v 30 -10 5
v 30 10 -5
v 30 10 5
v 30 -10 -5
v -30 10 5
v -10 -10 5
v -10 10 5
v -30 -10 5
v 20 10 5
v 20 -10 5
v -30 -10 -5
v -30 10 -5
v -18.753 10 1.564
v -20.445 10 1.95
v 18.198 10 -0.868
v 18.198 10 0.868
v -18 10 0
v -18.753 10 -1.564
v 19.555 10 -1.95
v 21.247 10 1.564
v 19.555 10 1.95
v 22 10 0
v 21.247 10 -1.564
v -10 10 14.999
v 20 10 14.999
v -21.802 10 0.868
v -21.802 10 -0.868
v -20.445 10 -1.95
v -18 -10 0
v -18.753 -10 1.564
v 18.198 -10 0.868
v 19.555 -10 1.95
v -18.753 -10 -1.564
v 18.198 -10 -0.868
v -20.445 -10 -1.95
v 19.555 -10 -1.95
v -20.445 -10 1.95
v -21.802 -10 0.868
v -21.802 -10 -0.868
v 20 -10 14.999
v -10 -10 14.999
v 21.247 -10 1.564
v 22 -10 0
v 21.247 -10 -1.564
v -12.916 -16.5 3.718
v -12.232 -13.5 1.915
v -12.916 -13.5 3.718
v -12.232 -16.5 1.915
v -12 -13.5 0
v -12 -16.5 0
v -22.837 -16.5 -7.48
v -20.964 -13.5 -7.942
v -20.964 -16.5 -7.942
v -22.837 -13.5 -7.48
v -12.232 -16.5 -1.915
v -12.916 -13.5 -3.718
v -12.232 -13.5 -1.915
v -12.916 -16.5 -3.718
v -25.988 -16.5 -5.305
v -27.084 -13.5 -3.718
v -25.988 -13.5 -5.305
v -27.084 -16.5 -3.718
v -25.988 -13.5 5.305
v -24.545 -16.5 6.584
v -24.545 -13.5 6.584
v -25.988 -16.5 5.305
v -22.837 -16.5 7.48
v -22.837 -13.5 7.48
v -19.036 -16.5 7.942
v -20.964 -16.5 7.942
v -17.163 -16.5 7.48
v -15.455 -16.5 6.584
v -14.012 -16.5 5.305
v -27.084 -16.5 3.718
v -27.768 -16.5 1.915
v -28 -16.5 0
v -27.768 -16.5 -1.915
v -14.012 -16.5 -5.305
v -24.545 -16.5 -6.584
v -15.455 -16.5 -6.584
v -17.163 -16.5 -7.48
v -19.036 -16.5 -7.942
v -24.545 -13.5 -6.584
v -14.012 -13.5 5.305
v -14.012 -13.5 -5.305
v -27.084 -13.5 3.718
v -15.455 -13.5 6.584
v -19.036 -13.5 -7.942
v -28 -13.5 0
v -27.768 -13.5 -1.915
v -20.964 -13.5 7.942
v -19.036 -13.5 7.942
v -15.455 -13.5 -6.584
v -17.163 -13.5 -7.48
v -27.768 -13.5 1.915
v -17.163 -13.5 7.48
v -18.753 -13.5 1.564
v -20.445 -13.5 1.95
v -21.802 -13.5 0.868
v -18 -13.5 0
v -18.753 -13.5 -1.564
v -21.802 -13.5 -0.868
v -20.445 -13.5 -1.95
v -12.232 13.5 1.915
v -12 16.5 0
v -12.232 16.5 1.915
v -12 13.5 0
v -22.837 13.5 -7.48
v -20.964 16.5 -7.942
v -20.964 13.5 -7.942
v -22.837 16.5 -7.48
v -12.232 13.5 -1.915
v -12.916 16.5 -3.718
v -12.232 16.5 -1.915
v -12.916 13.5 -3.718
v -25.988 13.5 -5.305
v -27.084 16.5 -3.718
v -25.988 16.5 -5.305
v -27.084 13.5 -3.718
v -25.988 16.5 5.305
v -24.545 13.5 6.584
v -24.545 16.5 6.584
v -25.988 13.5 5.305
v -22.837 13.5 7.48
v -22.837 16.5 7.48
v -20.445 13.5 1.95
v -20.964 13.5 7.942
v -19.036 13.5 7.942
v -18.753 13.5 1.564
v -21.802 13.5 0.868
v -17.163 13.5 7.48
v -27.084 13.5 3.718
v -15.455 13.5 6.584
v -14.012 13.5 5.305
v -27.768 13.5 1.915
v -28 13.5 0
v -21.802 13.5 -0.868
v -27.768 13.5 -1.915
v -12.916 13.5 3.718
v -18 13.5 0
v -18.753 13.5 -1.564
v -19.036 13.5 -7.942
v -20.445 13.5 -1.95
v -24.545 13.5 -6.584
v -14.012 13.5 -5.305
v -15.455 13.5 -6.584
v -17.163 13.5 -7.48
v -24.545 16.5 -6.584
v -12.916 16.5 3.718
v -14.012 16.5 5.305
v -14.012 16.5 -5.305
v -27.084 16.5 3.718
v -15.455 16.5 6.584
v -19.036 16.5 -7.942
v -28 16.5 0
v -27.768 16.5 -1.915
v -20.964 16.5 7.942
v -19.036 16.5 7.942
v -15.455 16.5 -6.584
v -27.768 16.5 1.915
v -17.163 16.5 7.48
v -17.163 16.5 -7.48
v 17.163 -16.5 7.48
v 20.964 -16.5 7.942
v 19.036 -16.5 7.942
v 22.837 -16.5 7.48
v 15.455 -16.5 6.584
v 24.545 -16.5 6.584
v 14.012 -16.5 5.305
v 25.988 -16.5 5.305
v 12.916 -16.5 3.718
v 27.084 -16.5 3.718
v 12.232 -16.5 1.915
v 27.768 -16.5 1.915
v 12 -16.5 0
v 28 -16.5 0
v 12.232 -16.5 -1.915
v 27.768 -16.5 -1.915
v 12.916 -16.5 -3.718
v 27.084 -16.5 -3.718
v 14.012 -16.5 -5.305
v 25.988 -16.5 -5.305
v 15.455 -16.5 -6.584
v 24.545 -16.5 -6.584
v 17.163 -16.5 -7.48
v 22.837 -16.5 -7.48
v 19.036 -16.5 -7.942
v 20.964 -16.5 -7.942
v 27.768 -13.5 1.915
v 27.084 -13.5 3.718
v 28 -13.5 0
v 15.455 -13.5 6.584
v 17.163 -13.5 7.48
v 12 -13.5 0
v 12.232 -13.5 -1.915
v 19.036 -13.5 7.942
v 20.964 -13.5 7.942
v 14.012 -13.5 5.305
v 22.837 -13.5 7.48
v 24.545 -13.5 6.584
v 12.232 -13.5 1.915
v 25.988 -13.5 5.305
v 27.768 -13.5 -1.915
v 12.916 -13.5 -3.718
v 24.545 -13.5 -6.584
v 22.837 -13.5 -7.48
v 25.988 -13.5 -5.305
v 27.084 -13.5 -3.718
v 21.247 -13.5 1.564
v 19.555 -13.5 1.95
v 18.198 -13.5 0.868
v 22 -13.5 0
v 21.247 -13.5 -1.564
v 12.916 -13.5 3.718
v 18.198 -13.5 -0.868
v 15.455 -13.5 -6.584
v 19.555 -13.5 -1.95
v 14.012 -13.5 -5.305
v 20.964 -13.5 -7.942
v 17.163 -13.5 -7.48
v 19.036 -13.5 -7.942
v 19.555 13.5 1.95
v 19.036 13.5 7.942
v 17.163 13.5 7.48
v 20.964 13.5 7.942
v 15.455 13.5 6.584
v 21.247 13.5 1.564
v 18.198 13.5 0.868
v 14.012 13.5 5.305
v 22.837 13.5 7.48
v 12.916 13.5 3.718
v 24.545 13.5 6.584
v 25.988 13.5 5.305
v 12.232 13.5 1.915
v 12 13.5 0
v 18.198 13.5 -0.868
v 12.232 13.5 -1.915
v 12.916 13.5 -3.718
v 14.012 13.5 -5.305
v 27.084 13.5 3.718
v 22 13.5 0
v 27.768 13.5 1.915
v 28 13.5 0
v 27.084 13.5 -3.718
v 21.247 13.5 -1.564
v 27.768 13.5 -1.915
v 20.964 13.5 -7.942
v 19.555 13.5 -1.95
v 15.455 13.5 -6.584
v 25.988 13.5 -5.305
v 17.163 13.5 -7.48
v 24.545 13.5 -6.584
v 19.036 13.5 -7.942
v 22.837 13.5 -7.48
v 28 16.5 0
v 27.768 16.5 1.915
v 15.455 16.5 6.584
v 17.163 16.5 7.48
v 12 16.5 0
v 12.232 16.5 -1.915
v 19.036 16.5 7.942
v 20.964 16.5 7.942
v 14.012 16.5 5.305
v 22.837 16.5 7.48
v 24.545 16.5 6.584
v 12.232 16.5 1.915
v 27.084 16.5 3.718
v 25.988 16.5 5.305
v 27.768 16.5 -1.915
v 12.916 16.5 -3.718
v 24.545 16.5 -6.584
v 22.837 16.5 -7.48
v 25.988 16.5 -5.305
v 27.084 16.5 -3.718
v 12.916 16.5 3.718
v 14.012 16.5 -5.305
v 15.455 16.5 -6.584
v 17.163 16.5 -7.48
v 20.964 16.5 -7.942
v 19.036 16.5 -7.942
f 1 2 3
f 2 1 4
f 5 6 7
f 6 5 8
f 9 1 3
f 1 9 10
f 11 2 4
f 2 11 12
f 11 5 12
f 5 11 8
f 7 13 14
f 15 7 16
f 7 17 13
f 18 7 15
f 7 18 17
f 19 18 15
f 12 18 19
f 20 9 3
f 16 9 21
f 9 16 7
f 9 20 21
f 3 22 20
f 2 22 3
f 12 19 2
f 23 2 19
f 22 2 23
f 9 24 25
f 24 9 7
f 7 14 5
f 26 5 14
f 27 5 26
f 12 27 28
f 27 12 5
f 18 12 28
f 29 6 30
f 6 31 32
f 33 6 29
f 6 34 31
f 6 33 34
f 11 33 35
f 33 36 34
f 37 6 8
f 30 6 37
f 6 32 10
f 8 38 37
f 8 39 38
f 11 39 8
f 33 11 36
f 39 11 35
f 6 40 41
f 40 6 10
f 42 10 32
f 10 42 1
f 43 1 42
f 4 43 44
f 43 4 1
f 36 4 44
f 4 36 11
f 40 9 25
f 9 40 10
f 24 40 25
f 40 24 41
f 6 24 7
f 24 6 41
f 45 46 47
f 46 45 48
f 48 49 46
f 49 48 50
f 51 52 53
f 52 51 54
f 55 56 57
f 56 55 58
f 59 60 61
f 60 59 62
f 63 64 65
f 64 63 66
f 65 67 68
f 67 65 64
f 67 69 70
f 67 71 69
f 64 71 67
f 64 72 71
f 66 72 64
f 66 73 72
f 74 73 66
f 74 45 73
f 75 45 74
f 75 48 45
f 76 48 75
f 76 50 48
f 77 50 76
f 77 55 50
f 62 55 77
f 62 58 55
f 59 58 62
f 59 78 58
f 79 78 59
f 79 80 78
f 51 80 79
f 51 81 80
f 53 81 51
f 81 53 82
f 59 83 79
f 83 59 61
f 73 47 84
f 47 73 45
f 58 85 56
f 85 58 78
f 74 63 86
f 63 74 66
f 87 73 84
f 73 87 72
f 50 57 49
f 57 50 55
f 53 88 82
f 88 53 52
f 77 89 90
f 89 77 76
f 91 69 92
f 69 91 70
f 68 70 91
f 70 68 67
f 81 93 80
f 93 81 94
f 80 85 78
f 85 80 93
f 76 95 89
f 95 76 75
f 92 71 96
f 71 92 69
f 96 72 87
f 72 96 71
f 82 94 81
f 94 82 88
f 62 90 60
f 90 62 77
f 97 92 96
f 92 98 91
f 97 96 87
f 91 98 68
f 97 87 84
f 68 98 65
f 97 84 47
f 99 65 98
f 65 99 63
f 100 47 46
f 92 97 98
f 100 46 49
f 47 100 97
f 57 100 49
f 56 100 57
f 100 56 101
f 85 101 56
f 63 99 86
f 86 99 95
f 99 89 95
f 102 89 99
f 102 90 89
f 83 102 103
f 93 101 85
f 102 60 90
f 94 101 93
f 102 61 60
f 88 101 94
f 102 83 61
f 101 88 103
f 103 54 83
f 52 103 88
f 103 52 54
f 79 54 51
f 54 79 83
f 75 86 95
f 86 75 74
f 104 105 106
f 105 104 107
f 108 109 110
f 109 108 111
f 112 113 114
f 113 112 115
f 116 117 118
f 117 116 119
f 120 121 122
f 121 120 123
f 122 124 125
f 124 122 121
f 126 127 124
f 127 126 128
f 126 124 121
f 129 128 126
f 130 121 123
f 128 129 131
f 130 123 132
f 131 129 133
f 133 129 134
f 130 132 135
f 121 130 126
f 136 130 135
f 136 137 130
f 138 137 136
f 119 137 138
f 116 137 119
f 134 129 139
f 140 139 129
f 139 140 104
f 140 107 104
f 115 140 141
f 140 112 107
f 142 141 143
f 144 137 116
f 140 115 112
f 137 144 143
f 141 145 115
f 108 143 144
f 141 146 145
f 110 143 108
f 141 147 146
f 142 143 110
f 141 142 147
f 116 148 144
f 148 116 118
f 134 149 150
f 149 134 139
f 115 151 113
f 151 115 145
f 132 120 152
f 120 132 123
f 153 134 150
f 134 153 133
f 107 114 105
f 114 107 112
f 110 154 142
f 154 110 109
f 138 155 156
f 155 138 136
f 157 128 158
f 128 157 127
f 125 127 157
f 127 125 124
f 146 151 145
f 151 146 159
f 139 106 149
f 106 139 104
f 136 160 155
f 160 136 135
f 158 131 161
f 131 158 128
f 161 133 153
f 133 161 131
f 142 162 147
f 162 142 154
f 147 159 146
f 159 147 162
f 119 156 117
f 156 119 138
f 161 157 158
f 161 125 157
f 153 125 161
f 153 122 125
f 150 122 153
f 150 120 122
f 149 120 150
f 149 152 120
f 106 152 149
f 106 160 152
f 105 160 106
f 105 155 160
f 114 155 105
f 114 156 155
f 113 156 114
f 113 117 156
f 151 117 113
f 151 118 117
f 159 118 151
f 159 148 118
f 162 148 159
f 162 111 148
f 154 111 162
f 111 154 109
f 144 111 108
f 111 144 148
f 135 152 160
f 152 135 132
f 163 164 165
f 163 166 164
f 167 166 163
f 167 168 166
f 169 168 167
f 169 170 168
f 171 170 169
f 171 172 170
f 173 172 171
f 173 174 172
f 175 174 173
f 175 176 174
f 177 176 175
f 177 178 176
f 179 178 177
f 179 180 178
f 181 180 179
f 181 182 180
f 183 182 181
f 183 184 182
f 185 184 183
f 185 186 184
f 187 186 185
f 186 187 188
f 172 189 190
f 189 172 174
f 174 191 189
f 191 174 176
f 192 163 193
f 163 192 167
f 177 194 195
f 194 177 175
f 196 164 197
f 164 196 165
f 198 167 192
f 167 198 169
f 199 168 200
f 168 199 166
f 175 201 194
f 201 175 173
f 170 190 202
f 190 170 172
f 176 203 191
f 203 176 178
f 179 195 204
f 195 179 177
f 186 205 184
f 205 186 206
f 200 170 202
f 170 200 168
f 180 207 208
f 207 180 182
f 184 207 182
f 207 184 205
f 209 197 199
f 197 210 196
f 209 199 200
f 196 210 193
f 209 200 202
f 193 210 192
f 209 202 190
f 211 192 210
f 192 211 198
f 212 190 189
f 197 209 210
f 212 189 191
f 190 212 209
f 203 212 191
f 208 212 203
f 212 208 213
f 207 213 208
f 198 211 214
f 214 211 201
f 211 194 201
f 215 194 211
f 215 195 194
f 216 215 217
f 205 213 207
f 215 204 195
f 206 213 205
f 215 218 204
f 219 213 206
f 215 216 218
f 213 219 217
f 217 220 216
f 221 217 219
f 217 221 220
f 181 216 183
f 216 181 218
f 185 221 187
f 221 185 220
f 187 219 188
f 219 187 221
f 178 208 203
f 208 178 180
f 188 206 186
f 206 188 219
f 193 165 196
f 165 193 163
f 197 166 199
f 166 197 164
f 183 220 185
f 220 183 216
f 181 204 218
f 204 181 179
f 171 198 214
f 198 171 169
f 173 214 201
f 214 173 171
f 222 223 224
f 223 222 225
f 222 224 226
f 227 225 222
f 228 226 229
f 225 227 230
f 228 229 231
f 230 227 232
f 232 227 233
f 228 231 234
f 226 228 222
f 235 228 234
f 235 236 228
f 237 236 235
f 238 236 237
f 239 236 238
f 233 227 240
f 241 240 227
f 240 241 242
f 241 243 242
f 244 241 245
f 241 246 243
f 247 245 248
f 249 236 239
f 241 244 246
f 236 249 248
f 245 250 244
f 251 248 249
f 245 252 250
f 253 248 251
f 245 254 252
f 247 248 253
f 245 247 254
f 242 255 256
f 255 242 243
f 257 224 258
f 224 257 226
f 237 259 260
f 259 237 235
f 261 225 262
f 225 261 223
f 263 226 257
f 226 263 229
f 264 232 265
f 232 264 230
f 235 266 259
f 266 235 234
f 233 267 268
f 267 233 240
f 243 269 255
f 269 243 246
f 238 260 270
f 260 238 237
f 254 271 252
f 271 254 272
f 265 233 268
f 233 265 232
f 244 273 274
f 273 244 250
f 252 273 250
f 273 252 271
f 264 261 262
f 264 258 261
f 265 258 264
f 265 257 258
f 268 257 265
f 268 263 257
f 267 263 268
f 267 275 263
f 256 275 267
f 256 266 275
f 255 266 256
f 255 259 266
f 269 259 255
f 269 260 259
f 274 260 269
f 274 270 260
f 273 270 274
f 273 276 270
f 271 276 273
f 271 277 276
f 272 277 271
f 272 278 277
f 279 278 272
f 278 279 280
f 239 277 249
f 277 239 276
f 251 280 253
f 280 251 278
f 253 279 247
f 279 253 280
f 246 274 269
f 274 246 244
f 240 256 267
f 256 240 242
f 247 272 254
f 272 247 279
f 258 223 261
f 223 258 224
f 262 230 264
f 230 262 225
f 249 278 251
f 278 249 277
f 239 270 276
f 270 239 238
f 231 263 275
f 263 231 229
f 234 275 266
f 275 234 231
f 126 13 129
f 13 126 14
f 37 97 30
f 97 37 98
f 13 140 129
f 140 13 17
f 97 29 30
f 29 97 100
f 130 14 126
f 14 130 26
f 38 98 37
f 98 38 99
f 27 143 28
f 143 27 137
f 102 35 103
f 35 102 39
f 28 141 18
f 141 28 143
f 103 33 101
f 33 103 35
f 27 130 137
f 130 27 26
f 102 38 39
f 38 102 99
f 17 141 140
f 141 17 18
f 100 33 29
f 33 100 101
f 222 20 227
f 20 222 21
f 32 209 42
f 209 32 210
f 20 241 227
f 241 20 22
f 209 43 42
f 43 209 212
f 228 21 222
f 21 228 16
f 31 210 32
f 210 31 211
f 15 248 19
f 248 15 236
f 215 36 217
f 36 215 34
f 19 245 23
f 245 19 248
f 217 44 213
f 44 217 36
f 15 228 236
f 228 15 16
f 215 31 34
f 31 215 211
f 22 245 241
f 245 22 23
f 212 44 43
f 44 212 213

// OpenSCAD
// Car body base
cube([60,20,10], center=true);

// Car body top
translate([5,0,10 - 0.001])
    cube([30,20,10],center=true);

// Front left wheel
translate([-20,-15,0])
    rotate([90,0,0])
    cylinder(h=3,r=8,center=true);

// Front right wheel
translate([-20,15,0])
    rotate([90,0,0])
    cylinder(h=3,r=8,center=true);

// Rear left wheel
translate([20,-15,0])
    rotate([90,0,0])
    cylinder(h=3,r=8,center=true);

// Rear right wheel
translate([20,15,0])
    rotate([90,0,0])
    cylinder(h=3,r=8,center=true);

// Front axle
translate([-20,0,0])
    rotate([90,0,0])
    cylinder(h=30,r=2,center=true);

// Rear axle
translate([20,0,0])
    rotate([90,0,0])
    cylinder(h=30,r=2,center=true);
